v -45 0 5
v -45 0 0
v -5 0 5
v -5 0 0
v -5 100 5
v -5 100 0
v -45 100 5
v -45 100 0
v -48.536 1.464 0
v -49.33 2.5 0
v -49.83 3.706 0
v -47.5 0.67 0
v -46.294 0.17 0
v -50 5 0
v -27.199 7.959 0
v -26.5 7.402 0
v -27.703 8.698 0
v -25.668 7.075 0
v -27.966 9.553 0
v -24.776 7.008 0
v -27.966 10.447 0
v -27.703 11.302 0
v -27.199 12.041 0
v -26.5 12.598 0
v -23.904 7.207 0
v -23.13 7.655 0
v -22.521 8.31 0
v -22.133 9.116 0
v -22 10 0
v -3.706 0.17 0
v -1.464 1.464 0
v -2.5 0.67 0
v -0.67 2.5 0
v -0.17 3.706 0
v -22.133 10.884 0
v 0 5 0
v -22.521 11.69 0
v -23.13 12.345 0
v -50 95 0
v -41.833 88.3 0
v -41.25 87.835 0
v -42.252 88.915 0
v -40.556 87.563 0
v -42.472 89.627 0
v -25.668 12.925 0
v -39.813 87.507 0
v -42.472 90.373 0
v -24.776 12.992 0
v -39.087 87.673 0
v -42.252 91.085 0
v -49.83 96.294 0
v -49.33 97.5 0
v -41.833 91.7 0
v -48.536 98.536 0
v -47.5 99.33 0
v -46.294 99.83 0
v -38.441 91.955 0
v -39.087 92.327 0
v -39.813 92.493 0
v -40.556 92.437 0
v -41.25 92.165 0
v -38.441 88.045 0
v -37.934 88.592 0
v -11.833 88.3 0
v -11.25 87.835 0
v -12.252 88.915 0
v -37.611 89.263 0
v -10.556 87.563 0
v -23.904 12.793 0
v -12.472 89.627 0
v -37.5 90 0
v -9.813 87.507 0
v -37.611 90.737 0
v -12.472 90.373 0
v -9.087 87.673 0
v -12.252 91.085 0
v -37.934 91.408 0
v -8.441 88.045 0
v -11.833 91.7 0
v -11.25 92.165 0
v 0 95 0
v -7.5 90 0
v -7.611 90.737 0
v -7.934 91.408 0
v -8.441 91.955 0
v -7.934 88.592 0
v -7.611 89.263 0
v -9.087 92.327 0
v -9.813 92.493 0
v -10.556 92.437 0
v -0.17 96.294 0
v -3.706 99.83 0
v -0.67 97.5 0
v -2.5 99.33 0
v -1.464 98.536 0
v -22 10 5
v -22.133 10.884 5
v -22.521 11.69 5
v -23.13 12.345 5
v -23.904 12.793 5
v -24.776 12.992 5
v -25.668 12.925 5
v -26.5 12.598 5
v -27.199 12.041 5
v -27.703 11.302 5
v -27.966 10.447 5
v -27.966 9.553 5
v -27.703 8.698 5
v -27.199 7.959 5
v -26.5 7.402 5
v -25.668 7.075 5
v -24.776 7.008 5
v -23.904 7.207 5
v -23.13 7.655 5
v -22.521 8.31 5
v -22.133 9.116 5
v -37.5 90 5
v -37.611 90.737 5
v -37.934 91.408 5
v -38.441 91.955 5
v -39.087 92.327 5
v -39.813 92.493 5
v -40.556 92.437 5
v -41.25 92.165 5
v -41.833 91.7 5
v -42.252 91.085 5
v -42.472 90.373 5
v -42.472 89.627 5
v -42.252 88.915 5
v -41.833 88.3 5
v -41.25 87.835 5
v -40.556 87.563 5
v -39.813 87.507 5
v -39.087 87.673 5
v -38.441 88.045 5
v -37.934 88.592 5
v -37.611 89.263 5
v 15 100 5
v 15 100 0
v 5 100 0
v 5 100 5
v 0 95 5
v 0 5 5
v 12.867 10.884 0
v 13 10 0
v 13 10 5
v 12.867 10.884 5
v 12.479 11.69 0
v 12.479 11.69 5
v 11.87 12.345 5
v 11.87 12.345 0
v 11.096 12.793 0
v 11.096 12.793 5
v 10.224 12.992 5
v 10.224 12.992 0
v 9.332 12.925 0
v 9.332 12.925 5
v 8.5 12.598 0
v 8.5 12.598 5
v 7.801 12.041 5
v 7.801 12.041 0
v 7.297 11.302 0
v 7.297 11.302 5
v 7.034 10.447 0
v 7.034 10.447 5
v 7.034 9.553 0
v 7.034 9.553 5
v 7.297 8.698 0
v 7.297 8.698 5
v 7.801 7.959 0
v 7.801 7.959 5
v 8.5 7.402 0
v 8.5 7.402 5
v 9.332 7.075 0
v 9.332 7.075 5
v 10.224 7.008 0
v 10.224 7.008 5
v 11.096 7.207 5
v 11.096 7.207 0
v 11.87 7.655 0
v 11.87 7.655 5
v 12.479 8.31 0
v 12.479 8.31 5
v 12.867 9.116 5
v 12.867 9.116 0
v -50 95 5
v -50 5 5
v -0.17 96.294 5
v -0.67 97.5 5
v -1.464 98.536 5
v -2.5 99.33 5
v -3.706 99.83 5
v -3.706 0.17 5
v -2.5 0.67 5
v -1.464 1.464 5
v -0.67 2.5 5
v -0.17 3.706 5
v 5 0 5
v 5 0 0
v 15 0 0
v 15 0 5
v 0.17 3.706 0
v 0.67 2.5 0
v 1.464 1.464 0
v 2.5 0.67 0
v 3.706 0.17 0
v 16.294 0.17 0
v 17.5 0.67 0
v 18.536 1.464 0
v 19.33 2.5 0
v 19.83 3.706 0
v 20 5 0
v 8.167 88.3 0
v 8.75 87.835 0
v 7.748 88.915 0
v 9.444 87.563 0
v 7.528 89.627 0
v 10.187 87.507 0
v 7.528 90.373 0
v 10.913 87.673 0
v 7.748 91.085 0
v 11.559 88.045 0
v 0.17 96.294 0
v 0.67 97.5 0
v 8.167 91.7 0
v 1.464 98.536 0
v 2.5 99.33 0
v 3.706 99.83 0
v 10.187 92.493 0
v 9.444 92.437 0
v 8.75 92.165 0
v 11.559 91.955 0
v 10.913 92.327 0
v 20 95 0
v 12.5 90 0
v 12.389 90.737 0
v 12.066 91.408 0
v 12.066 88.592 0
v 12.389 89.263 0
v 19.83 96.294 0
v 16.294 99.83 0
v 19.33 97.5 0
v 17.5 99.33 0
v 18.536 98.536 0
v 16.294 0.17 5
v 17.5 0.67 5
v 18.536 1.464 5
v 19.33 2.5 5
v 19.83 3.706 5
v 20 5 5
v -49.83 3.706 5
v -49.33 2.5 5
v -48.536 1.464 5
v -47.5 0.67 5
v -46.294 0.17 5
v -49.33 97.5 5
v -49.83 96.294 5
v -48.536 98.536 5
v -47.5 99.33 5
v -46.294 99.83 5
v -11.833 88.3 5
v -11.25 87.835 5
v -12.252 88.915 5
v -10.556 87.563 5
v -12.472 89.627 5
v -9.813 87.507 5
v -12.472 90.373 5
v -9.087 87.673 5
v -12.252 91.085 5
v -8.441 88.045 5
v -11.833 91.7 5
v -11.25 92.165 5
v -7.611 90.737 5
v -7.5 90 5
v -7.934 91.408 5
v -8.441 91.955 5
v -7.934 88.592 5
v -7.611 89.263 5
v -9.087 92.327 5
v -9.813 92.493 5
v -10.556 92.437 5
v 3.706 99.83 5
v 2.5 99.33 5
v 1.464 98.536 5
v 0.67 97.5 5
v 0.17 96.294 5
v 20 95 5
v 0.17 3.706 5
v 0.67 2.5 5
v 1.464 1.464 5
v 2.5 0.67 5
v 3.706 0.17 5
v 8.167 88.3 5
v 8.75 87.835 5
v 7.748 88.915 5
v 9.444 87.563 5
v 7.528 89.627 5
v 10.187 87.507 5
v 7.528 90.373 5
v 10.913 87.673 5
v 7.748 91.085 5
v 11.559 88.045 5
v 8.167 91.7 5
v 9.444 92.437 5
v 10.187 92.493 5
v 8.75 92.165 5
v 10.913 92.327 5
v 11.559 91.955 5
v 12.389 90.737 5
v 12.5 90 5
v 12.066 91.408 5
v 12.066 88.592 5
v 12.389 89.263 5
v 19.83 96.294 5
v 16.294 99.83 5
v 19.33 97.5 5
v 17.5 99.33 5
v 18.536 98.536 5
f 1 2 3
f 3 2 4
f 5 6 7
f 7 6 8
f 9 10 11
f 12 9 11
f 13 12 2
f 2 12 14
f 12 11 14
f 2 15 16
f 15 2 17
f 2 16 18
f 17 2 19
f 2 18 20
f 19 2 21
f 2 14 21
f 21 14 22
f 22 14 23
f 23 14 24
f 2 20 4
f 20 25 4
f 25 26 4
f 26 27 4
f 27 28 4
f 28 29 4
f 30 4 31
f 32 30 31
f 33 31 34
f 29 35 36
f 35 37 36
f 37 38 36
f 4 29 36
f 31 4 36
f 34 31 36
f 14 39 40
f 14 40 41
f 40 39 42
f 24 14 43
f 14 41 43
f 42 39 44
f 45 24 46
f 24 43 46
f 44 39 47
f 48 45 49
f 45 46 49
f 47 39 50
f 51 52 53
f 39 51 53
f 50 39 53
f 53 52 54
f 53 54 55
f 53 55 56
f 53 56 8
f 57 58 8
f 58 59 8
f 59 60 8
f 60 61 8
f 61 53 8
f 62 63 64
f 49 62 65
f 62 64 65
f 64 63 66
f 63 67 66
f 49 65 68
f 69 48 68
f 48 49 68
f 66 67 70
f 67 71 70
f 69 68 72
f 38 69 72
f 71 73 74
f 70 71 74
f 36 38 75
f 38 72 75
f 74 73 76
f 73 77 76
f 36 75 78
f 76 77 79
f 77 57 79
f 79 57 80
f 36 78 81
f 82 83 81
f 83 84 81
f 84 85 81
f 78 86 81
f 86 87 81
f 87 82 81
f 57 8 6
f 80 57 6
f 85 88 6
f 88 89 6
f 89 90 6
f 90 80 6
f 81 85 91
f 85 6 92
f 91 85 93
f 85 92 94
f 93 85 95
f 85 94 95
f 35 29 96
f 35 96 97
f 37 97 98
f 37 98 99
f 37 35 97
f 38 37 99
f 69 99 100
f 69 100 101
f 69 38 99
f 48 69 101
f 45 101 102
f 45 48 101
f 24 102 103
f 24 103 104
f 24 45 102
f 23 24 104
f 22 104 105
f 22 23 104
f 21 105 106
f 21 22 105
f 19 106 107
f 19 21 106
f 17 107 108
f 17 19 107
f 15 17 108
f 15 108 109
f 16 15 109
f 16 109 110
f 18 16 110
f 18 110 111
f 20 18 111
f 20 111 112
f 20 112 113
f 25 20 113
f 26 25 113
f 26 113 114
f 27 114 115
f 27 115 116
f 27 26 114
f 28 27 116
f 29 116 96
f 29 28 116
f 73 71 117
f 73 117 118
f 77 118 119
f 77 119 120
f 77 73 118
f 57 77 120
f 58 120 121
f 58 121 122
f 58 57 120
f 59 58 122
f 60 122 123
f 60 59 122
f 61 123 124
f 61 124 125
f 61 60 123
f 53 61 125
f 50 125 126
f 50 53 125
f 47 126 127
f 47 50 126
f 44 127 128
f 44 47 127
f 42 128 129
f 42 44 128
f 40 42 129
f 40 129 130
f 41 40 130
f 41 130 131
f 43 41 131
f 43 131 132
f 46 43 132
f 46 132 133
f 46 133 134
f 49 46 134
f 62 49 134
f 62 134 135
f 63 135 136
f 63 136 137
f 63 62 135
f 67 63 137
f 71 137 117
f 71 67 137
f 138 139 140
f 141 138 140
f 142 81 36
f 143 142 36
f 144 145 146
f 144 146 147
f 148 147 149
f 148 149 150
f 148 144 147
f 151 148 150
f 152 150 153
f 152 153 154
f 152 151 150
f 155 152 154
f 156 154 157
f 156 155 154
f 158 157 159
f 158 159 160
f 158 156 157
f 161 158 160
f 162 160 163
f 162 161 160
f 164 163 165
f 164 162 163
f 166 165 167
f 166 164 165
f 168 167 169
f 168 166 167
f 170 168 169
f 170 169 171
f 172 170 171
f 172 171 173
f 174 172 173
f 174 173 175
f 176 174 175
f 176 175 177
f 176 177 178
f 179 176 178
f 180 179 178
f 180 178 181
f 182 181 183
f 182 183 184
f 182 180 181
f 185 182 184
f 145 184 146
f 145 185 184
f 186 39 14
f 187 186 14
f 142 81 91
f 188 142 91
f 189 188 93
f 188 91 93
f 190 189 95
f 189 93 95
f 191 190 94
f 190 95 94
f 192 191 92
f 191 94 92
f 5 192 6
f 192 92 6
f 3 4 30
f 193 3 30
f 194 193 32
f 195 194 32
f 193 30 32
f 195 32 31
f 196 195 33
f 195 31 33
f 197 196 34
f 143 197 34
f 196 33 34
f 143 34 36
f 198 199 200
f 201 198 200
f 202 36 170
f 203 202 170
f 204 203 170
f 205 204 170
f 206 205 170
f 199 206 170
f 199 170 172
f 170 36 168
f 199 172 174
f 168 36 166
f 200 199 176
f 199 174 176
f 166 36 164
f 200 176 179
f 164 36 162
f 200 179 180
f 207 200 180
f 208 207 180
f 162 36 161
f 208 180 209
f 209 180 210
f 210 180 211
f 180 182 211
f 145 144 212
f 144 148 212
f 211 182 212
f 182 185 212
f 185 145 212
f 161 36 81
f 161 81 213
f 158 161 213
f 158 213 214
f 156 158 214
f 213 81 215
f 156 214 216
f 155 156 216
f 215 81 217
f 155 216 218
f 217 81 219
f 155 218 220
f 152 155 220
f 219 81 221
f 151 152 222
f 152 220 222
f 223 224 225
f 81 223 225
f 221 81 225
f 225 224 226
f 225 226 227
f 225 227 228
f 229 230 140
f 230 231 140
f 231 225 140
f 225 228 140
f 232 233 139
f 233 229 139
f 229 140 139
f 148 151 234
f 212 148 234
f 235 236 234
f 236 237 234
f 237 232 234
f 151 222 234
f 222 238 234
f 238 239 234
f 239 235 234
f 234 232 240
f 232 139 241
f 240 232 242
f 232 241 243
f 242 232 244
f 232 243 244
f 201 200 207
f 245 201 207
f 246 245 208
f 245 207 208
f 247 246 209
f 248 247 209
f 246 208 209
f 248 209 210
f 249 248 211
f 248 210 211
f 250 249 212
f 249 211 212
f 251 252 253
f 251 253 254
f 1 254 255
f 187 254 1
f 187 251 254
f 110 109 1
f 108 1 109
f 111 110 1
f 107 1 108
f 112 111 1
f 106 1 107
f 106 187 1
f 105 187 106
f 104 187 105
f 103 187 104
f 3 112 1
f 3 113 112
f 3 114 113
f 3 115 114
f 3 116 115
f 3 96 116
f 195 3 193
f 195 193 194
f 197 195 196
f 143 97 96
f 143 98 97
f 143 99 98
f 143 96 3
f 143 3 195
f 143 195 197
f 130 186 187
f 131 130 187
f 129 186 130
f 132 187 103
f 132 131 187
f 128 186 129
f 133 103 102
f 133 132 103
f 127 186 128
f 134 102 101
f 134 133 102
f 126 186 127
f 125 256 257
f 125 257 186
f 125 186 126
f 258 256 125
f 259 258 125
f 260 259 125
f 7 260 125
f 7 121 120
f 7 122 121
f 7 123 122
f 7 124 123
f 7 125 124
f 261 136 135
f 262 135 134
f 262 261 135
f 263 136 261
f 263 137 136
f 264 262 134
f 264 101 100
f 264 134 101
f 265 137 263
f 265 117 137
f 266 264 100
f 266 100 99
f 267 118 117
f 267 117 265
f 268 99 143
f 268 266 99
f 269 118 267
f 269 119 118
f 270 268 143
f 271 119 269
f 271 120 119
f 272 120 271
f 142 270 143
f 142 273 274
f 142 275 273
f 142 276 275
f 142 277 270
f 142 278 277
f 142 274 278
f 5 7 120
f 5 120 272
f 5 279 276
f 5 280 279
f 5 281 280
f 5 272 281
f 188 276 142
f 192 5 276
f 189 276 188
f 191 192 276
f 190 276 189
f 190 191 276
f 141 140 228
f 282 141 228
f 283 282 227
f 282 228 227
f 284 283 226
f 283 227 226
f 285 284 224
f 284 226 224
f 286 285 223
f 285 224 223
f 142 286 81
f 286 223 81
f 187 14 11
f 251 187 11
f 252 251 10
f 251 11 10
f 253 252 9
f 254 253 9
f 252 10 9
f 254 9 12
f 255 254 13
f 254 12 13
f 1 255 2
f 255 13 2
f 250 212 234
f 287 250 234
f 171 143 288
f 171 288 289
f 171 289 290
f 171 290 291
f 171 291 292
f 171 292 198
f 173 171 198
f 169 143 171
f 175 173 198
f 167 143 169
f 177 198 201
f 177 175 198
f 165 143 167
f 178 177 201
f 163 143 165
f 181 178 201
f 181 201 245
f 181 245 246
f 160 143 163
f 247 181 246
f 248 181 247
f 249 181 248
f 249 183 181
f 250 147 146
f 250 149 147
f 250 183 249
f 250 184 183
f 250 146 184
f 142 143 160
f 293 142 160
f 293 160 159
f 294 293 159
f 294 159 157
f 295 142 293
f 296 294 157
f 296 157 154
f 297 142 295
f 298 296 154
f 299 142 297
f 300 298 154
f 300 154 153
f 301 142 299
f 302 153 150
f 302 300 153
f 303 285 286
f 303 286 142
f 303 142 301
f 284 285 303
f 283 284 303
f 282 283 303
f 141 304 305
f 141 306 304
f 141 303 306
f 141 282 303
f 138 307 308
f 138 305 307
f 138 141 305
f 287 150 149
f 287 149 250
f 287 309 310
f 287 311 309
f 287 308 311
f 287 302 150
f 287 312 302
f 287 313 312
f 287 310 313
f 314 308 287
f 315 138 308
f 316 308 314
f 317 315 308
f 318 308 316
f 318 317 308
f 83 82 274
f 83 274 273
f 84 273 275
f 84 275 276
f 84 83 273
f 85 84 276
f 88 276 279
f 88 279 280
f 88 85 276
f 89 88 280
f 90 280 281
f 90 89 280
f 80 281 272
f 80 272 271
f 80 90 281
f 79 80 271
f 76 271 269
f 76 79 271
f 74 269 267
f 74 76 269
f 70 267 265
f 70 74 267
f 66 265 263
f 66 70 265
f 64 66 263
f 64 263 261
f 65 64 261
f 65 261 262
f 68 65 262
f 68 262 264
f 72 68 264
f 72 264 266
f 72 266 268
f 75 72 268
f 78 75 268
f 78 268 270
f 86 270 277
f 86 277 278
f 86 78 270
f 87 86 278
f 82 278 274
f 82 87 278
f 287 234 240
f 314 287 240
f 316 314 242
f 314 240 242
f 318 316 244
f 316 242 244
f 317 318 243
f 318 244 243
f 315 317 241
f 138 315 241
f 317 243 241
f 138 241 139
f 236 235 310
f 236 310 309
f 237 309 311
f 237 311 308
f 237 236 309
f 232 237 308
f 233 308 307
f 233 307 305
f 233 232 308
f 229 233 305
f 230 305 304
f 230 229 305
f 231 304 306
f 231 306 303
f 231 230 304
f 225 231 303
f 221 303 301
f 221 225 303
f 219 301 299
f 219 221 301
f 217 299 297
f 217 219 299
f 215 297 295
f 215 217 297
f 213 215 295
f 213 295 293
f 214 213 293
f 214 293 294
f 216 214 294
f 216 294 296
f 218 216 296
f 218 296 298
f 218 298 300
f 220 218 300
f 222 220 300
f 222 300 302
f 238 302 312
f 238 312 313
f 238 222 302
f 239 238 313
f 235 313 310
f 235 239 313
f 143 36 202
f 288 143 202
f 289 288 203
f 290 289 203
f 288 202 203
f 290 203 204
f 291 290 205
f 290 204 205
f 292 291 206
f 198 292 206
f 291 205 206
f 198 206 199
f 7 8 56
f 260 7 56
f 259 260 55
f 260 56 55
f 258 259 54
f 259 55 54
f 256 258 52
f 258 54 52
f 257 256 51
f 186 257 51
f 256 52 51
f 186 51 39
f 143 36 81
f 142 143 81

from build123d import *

# Parameters (mm, degrees)
F0_R     = 3
F0_R_2   = 2.5
F1_DEPTH = 5
F2_R     = 3
F2_R_2   = 2.5
F3_DEPTH = 5


with BuildPart() as f1:
    # F0 (on Top) → F1 (new body)
    with BuildSketch(Plane.XY):
        with BuildLine():
            ThreePointArc((0, 5), (1.464466, 1.464466), (5, 0))
            Line((5, 0), (15, 0))
            ThreePointArc((15, 0), (18.535534, 1.464466), (20, 5))
            Line((20, 5), (20, 95))
            ThreePointArc((20, 95), (18.535534, 98.535534), (15, 100))
            Line((15, 100), (5, 100))
            ThreePointArc((5, 100), (1.464466, 98.535534), (0, 95))
            Line((0, 95), (0, 5))
        make_face()
        with Locations((10, 10)):
            Circle(F0_R, mode=Mode.SUBTRACT)
        with Locations((10, 90)):
            Circle(F0_R_2, mode=Mode.SUBTRACT)
    extrude(amount=F1_DEPTH)


with BuildPart() as f3:
    # F2 (on Top) → F3 (new body)
    with BuildSketch(Plane.XY):
        with BuildLine():
            Line((-45, 0), (-5, 0))
            ThreePointArc((-5, 0), (-1.464466, 1.464466), (0, 5))
            Line((0, 5), (0, 95))
            ThreePointArc((0, 95), (-1.464466, 98.535534), (-5, 100))
            Line((-5, 100), (-45, 100))
            ThreePointArc((-45, 100), (-48.535534, 98.535534), (-50, 95))
            Line((-50, 95), (-50, 5))
            ThreePointArc((-50, 5), (-48.535534, 1.464466), (-45, 0))
        make_face()
        with Locations((-25, 10)):
            Circle(F2_R, mode=Mode.SUBTRACT)
        with Locations((-40, 90)):
            Circle(F2_R_2, mode=Mode.SUBTRACT)
        with Locations((-10, 90)):
            Circle(F2_R_2, mode=Mode.SUBTRACT)
    extrude(amount=F3_DEPTH)


solid = Compound([f1.part, f3.part])
